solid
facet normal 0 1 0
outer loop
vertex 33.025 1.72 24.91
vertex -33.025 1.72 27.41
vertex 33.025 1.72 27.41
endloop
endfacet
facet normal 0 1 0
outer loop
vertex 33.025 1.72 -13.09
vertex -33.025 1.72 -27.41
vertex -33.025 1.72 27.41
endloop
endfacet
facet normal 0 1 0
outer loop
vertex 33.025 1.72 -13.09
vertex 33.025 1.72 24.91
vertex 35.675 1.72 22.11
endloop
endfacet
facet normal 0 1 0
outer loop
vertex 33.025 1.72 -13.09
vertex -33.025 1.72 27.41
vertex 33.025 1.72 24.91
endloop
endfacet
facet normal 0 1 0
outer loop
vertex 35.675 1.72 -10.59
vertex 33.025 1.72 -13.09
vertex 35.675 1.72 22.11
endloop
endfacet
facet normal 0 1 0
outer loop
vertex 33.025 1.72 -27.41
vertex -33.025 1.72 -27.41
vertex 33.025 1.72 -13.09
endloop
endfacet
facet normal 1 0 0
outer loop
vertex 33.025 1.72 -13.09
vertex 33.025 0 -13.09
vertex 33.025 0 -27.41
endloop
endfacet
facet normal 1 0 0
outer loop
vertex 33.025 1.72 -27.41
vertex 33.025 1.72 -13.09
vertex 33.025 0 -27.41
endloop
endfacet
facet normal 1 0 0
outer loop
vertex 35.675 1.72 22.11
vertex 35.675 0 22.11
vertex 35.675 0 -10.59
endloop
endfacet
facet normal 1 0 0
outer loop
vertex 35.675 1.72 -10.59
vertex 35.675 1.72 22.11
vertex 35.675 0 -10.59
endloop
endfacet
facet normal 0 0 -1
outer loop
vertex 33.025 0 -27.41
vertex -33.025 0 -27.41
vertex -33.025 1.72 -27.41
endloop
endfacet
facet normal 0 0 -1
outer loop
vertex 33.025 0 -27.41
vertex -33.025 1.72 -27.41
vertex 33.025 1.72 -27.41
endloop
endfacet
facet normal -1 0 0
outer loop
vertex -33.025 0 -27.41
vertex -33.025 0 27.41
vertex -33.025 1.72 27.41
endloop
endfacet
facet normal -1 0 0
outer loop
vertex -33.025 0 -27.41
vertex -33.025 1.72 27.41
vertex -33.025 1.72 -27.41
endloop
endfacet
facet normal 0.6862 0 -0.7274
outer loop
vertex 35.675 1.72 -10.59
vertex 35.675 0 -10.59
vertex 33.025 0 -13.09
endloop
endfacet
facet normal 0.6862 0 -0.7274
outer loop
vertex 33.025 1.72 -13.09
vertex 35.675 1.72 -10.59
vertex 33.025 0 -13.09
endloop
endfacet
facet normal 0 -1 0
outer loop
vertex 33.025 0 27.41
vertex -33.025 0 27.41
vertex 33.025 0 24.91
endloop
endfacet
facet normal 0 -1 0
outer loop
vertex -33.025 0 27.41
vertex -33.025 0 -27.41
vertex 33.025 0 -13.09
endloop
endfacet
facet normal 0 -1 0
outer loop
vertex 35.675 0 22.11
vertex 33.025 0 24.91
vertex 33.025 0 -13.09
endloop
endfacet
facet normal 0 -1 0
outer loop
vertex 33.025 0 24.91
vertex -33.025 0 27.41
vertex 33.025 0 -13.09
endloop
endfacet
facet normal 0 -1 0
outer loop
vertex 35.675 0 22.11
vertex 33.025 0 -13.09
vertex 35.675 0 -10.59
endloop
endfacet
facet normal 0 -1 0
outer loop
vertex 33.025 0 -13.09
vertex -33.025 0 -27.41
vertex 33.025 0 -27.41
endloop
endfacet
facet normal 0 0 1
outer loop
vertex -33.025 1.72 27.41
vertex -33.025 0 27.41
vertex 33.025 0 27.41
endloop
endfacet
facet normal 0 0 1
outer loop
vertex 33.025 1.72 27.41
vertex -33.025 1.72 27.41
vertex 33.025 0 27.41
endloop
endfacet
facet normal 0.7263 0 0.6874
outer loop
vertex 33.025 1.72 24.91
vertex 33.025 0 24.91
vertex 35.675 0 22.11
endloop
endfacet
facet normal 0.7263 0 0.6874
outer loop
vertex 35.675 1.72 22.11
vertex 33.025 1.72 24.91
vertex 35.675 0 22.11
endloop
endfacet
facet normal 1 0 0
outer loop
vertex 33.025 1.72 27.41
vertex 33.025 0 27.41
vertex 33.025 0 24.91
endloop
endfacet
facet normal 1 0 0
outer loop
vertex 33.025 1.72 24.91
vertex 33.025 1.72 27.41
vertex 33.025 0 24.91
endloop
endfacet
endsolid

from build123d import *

# Parameters (mm, degrees)
CROQUIS1_W              = 66.05
CROQUIS1_H              = 54.82
SALIENTE_EXTRUIR1_DEPTH = 1.72


with BuildPart() as part:
    # Croquis1 → Saliente-Extruir1 (new body)
    with BuildSketch(Plane(origin=(0, 0, 0), x_dir=(1, 0, 0), z_dir=(0, 1, 0))):
        Rectangle(CROQUIS1_W, CROQUIS1_H)
        Polygon((35.675, 10.59), (33.025, 13.09), (33.025, -24.91), (35.675, -22.11), align=None)
    extrude(amount=SALIENTE_EXTRUIR1_DEPTH)


solid = part.part
